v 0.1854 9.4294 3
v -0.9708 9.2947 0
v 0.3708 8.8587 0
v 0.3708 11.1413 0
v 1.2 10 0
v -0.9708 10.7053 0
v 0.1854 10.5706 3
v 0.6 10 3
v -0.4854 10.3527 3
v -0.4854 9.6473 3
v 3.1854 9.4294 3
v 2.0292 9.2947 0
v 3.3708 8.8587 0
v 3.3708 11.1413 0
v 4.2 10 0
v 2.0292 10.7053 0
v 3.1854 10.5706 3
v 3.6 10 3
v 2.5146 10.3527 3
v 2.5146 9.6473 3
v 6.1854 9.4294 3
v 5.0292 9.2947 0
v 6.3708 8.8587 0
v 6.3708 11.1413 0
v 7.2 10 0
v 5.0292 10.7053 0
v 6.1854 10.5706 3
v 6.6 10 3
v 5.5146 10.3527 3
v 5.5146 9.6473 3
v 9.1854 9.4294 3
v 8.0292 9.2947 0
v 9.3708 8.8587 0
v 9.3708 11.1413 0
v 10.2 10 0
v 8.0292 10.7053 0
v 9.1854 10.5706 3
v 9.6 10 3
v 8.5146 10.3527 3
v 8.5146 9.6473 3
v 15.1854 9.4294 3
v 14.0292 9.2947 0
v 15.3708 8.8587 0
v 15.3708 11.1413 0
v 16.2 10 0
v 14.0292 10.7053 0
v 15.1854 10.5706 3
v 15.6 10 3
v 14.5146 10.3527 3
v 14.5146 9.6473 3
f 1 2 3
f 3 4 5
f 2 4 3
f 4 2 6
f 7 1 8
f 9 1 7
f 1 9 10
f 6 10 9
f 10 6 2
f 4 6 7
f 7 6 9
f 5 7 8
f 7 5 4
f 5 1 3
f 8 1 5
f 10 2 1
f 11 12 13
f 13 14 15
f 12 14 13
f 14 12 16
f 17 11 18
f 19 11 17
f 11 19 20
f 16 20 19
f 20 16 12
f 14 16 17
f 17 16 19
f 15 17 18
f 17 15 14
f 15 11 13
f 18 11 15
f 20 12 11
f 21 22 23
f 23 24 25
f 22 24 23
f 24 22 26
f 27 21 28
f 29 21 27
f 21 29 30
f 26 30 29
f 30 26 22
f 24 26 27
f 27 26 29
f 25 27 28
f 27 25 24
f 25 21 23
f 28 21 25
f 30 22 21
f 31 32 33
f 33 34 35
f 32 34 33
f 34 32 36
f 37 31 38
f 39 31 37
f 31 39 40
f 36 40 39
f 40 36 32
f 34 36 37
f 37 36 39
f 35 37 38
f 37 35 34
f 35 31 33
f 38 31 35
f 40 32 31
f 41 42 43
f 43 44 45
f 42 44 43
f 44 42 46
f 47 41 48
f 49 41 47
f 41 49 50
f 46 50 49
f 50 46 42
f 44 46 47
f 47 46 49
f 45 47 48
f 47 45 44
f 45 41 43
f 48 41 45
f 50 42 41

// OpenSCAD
union() {
	translate([0, 10, 0]) cylinder(r1=1.2, r2=0.6, h=3);
	translate([3, 10, 0]) cylinder(r1=1.2, r2=0.6, h=3);
	translate([6, 10, 0]) cylinder(r1=1.2, r2=0.6, h=3);
	translate([9, 10, 0]) cylinder(r1=1.2, r2=0.6, h=3);
	translate([15, 10, 0]) cylinder(r1=1.2, r2=0.6, h=3);
}
